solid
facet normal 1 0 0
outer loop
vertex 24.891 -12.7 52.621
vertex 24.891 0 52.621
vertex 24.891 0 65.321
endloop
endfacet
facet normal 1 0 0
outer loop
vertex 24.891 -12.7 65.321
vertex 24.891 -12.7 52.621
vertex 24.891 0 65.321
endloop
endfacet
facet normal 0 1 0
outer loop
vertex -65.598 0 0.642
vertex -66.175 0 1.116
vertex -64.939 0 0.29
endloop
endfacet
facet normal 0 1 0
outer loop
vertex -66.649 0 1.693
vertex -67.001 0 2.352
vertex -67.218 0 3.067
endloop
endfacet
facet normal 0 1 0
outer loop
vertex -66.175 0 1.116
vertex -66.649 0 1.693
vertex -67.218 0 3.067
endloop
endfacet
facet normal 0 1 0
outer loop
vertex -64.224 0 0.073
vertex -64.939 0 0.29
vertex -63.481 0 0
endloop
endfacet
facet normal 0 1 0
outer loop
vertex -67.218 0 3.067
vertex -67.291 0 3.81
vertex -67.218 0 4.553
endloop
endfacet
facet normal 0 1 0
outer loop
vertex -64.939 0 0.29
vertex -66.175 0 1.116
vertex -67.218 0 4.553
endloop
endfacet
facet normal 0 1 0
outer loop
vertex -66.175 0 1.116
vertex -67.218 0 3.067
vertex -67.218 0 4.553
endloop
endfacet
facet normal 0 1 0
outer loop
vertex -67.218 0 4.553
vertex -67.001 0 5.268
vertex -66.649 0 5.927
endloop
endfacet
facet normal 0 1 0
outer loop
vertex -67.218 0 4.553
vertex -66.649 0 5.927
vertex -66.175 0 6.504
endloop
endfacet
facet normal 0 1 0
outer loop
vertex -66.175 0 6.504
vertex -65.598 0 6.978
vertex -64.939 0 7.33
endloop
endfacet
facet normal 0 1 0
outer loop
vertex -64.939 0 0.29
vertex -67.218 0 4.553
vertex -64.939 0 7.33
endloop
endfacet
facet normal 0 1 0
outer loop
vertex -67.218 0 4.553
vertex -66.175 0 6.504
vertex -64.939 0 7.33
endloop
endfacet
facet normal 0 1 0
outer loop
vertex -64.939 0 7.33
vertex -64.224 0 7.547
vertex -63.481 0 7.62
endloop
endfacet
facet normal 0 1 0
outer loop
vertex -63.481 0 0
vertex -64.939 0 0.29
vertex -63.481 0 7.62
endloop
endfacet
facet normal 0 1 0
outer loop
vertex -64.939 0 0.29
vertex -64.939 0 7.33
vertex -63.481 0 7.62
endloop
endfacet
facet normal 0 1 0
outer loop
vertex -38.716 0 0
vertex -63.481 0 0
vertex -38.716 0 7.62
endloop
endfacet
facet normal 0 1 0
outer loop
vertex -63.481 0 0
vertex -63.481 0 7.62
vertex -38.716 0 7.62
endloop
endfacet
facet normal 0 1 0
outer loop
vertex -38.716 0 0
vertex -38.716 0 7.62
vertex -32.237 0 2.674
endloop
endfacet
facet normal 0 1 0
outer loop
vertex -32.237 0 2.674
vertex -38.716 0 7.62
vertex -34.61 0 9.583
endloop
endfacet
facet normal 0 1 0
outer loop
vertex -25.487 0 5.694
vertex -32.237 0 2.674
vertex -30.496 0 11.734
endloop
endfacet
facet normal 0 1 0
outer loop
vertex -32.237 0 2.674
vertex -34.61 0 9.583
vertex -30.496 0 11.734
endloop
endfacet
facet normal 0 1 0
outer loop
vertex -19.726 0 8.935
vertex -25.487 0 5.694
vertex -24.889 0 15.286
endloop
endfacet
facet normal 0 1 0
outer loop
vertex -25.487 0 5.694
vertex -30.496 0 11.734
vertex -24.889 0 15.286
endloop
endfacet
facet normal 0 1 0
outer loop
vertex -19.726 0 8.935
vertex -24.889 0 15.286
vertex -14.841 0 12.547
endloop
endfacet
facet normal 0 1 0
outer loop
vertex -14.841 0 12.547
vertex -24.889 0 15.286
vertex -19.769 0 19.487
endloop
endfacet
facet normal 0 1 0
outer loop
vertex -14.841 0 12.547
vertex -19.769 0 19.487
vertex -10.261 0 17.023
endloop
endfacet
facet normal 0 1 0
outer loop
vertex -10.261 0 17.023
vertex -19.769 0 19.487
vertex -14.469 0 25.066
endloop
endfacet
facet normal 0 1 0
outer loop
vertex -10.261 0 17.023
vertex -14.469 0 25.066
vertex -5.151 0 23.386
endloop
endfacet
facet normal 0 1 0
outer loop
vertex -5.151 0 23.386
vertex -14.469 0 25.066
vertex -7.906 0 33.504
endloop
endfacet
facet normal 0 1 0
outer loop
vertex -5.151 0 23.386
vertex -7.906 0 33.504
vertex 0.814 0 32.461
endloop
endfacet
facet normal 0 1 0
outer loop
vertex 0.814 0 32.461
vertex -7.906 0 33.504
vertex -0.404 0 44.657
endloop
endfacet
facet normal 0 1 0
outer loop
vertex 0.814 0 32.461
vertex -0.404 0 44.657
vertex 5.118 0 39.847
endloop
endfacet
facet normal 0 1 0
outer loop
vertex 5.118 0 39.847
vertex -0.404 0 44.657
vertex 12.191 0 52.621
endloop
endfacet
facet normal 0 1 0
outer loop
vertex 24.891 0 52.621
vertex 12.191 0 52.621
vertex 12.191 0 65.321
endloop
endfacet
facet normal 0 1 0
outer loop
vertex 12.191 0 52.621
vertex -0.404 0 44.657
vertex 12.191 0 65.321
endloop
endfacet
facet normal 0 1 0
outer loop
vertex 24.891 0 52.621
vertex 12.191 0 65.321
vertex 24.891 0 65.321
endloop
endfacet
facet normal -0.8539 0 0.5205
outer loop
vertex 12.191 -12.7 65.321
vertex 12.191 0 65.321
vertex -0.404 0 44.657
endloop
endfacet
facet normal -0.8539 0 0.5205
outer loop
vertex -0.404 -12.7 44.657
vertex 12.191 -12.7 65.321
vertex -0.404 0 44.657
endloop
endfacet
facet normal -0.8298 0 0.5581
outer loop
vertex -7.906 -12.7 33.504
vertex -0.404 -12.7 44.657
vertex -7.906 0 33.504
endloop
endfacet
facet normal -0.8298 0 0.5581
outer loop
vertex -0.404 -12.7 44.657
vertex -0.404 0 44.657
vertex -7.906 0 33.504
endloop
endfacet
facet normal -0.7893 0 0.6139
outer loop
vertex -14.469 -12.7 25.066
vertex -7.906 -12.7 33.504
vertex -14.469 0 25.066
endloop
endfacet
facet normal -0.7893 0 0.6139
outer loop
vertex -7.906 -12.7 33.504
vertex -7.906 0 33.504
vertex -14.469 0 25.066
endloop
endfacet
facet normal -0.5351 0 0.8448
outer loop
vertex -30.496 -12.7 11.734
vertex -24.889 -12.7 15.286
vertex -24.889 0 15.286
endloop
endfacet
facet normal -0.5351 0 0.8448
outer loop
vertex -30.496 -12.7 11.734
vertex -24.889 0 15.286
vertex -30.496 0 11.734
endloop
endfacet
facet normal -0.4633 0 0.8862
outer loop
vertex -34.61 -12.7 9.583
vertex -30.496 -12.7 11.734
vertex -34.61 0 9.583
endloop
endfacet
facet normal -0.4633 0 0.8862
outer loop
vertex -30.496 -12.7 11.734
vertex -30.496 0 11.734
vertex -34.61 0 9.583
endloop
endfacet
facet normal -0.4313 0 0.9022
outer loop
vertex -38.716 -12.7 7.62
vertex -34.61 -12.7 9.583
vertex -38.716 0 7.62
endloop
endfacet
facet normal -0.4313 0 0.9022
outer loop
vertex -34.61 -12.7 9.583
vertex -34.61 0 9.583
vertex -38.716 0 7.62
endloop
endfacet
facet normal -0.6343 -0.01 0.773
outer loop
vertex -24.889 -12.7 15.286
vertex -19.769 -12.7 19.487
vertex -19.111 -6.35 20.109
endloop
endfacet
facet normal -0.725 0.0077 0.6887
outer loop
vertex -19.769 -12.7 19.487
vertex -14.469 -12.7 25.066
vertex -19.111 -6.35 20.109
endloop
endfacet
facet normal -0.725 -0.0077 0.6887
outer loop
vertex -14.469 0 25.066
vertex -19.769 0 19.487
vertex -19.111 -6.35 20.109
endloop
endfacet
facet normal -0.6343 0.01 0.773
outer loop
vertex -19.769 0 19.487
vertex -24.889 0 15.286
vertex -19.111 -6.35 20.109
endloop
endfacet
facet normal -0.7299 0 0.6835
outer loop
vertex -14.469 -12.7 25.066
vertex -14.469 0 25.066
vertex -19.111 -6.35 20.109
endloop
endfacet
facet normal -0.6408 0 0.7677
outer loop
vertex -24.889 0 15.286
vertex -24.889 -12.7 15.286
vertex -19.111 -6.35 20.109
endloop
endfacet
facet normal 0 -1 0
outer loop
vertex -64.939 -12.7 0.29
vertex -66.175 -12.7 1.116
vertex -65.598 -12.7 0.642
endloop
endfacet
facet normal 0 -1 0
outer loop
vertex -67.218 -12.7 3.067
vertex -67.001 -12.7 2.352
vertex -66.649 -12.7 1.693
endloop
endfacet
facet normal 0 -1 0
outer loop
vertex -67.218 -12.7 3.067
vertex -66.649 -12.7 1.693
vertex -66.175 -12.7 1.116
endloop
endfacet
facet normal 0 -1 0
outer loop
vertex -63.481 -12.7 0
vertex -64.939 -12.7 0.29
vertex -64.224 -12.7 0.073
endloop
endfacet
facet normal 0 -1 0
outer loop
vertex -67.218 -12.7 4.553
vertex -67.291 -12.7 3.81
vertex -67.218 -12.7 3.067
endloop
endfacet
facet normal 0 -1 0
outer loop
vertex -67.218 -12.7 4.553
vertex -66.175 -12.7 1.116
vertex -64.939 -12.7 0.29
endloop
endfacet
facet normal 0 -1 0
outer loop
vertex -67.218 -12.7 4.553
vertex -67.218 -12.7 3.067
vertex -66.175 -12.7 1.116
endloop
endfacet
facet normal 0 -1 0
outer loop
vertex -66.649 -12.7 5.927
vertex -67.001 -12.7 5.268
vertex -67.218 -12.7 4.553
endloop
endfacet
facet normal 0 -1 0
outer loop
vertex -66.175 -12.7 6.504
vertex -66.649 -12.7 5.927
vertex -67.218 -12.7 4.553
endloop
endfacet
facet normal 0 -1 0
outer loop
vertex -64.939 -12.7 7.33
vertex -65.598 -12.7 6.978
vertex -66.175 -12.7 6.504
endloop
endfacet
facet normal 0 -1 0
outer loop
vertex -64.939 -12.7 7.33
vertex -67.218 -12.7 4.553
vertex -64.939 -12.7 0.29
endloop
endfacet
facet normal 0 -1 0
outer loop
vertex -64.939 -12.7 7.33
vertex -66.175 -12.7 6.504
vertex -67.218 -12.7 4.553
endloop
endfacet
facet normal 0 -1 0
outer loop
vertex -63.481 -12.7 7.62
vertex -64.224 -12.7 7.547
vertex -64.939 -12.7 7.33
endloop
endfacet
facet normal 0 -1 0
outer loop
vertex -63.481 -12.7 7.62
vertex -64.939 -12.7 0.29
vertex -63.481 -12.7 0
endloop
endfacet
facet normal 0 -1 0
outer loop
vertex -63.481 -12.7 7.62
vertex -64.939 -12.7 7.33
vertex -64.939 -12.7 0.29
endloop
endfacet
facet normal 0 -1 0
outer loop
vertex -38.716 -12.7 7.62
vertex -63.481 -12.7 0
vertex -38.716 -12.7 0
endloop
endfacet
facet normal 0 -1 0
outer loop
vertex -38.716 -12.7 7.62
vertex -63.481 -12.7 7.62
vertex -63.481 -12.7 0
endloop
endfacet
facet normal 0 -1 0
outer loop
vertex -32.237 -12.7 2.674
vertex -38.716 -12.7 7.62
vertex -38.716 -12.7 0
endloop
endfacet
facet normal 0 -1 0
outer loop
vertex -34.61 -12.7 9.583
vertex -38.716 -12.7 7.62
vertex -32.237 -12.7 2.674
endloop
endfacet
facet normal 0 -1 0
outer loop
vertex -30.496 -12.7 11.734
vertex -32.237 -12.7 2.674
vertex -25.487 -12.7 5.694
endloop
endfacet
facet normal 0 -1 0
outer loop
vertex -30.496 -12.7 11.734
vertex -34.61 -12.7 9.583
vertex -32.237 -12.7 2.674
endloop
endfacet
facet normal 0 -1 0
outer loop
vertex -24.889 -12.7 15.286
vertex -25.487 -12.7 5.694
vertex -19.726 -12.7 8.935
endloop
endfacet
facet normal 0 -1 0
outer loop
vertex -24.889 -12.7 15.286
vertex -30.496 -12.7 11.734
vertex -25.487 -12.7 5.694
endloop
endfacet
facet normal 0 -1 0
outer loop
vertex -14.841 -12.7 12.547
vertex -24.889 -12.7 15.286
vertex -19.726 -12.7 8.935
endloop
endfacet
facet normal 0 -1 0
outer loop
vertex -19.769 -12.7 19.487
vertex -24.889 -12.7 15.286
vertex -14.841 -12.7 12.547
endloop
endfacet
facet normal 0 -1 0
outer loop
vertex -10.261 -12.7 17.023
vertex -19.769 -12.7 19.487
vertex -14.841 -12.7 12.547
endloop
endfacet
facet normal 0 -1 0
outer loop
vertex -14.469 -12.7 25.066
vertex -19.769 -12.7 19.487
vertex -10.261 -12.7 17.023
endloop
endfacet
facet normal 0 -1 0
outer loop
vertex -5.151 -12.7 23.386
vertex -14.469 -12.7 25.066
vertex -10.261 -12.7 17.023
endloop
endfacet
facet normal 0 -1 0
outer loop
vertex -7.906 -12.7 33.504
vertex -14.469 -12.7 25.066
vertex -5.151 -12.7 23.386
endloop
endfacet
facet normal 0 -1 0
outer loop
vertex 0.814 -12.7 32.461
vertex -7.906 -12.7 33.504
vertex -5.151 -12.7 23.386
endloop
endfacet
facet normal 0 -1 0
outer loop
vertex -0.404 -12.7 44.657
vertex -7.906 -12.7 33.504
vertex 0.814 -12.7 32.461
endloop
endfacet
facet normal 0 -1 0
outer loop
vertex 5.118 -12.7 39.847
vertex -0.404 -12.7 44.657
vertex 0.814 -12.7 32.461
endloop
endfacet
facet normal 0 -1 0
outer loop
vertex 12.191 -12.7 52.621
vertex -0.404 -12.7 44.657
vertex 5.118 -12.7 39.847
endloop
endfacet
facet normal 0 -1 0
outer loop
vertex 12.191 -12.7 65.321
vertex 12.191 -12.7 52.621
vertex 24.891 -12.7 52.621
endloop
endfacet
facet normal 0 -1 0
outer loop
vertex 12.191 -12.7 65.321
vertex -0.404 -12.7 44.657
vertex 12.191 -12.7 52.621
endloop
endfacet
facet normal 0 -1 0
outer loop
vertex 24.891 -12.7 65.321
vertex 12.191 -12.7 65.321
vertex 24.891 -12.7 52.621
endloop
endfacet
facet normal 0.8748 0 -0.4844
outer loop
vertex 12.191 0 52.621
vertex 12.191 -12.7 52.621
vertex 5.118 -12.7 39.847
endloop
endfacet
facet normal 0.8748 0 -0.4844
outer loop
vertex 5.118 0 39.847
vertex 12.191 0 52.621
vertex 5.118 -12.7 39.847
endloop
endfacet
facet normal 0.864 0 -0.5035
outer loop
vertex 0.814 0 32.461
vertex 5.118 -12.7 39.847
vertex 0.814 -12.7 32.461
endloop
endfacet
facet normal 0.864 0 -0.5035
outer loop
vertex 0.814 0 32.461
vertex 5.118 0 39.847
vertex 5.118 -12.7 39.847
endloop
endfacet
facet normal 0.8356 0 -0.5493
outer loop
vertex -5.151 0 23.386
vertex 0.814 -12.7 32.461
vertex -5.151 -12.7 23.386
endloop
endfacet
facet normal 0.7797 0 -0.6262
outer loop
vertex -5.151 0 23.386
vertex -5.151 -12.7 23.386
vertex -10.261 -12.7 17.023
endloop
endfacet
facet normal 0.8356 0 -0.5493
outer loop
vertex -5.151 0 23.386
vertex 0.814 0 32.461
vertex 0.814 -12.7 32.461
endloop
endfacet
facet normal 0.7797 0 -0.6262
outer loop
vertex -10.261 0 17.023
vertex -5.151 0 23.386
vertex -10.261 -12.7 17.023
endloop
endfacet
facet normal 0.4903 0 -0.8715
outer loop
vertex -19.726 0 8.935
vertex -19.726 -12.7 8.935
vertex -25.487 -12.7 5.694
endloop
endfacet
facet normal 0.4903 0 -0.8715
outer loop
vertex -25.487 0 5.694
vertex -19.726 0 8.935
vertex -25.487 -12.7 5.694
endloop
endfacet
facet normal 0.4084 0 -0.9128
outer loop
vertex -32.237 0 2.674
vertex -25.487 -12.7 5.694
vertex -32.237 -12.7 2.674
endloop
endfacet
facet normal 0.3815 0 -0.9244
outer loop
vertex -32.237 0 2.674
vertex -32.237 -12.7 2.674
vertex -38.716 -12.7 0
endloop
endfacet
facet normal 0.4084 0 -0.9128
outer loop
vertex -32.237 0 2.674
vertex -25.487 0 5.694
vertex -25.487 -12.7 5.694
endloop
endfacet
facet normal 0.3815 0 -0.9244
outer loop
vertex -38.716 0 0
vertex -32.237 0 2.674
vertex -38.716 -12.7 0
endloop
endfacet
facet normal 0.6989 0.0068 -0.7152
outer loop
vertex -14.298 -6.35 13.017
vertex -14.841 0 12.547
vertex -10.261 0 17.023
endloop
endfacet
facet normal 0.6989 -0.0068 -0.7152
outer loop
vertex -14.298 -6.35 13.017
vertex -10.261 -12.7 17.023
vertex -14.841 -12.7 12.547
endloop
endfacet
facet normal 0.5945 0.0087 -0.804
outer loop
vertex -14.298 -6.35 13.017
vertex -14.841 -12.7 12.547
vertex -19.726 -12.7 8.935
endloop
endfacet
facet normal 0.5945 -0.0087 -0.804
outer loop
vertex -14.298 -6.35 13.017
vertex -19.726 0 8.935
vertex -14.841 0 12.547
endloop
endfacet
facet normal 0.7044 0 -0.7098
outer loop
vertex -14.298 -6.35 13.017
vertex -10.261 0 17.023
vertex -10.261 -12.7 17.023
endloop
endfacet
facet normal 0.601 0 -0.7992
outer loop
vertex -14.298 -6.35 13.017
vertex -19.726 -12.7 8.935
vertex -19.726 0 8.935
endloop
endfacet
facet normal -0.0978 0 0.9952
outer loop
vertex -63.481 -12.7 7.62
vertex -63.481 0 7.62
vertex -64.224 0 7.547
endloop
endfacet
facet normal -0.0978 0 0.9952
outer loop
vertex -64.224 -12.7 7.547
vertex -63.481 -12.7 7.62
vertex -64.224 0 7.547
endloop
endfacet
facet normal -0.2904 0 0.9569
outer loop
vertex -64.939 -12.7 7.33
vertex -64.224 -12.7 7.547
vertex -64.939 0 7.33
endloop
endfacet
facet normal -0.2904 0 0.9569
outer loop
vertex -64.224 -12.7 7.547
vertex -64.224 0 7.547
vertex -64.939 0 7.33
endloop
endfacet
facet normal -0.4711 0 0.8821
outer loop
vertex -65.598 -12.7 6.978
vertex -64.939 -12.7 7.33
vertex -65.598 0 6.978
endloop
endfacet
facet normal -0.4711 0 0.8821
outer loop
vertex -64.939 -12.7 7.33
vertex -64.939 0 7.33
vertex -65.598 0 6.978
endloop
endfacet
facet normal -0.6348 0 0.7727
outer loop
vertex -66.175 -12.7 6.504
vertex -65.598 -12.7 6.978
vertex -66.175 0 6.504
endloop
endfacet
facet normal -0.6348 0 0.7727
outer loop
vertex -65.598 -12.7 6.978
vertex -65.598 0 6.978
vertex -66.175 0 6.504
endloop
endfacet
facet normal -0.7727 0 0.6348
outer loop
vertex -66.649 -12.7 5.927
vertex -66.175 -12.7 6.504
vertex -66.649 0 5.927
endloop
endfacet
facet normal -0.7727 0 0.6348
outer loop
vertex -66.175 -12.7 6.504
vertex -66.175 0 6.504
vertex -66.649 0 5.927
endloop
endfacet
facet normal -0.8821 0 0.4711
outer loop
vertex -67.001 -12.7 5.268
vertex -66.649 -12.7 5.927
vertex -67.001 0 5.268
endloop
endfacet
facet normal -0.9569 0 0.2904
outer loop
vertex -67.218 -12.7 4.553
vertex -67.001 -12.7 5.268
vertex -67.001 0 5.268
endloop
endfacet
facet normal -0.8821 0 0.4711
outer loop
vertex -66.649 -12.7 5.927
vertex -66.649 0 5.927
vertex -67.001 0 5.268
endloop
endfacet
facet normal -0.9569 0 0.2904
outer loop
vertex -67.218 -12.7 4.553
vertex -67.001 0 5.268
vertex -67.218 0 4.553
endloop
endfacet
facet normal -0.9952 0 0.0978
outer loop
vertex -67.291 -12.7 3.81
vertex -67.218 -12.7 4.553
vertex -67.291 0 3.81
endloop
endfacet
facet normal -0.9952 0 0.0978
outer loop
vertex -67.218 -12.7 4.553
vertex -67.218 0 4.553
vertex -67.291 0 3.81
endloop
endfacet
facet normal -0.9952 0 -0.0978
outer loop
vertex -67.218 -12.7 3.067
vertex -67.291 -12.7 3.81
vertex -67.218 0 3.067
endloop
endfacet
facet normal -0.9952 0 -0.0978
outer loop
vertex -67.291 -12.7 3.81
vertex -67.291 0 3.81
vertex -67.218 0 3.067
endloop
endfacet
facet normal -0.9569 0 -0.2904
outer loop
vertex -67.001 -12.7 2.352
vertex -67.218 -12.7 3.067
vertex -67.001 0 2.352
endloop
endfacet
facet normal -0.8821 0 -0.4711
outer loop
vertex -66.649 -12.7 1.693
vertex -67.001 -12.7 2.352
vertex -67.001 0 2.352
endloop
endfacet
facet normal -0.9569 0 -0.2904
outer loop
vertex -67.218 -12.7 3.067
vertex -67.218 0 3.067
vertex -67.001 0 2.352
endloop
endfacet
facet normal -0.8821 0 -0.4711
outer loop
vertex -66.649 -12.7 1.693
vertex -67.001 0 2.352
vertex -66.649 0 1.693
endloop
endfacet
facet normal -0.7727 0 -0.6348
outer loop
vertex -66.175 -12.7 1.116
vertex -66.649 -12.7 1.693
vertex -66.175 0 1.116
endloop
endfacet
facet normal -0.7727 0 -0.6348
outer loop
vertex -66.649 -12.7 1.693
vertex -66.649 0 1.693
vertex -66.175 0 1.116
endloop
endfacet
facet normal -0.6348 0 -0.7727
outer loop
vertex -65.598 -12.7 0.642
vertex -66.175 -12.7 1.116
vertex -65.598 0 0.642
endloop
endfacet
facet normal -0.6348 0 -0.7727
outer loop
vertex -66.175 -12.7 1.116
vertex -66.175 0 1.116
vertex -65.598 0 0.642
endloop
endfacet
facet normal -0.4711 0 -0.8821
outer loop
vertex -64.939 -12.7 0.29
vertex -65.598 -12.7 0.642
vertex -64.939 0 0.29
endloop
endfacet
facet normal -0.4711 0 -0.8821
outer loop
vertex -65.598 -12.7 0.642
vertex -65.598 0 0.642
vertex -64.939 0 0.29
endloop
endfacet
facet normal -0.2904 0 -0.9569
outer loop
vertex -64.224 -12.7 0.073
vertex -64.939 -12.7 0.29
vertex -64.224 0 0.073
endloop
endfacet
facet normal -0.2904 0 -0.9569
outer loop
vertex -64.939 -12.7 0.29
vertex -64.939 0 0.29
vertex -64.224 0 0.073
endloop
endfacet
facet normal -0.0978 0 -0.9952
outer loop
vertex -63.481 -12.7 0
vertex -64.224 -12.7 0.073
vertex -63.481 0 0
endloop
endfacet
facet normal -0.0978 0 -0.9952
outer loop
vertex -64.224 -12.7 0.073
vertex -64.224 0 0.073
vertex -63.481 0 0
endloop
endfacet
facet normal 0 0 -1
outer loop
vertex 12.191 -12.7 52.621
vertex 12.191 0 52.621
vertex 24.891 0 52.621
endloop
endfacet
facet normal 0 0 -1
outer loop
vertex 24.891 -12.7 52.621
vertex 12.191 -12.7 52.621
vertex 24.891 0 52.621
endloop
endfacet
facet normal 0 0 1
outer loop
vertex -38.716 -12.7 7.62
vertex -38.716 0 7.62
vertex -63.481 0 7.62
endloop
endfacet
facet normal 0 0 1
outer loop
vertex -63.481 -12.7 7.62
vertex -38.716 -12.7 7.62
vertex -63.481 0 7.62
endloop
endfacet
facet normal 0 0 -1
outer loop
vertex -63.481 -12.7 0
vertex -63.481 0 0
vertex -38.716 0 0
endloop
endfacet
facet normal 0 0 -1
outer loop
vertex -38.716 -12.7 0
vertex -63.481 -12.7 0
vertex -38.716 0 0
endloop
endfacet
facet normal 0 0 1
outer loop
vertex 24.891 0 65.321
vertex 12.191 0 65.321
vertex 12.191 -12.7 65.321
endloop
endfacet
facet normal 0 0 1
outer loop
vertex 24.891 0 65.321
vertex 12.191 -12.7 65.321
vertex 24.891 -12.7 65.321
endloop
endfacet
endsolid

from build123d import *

# Parameters (mm, degrees)
F0_W     = 12.7
F0_H     = 12.7
F1_DEPTH = 12.7
F2_DEPTH = 12.7


with BuildPart() as f1:
    # F0 (on Front) → F1 (new body)
    with BuildSketch(Plane.XZ):
        with Locations((18.5406431556, 58.970926)):
            Rectangle(F0_W, F0_H)
        with BuildLine():
            Line((12.1906431556, 52.620926), (12.1906431556, 65.320926))
            add(Edge.make_bspline(
                [(12.1906431556, 65.320926), (1.6408012652, 47.6242484273), (-15.7682649232, 18.4216656416), (-32.2303568983, 10.6729982106), (-38.7164705157, 7.62)],
                knots=[0, 0, 0, 0, 0.6059970004, 1, 1, 1, 1], degree=3))
            Line((-38.7164705157, 7.62), (-63.4810701013, 7.62))
            ThreePointArc((-63.4810701013, 7.62), (-67.2910701013, 3.81), (-63.4810701013, 0))
            Line((-63.4810701013, 0), (-38.7164705157, 0))
            add(Edge.make_bspline(
                [(12.1906431556, 52.620926), (3.8448232521, 37.5782991027), (-10.2312518477, 10.0416995234), (-31.0323794757, 3.2870267288), (-38.7164705157, 0)],
                knots=[0, 0, 0, 0, 0.5675080648, 1, 1, 1, 1], degree=3))
        make_face()
    extrude(amount=F1_DEPTH)

    # F0 (on Front) → F2 (join)
    with BuildSketch(Plane.XZ):
        with Locations((18.5406431556, 58.970926)):
            Rectangle(F0_W, F0_H)
        with BuildLine():
            Line((12.1906431556, 52.620926), (12.1906431556, 65.320926))
            add(Edge.make_bspline(
                [(12.1906431556, 65.320926), (1.6408012652, 47.6242484273), (-15.7682649232, 18.4216656416), (-32.2303568983, 10.6729982106), (-38.7164705157, 7.62)],
                knots=[0, 0, 0, 0, 0.6059970004, 1, 1, 1, 1], degree=3))
            Line((-38.7164705157, 7.62), (-63.4810701013, 7.62))
            ThreePointArc((-63.4810701013, 7.62), (-67.2910701013, 3.81), (-63.4810701013, 0))
            Line((-63.4810701013, 0), (-38.7164705157, 0))
            add(Edge.make_bspline(
                [(12.1906431556, 52.620926), (3.8448232521, 37.5782991027), (-10.2312518477, 10.0416995234), (-31.0323794757, 3.2870267288), (-38.7164705157, 0)],
                knots=[0, 0, 0, 0, 0.5675080648, 1, 1, 1, 1], degree=3))
        make_face()
    extrude(amount=F2_DEPTH)


solid = f1.part
